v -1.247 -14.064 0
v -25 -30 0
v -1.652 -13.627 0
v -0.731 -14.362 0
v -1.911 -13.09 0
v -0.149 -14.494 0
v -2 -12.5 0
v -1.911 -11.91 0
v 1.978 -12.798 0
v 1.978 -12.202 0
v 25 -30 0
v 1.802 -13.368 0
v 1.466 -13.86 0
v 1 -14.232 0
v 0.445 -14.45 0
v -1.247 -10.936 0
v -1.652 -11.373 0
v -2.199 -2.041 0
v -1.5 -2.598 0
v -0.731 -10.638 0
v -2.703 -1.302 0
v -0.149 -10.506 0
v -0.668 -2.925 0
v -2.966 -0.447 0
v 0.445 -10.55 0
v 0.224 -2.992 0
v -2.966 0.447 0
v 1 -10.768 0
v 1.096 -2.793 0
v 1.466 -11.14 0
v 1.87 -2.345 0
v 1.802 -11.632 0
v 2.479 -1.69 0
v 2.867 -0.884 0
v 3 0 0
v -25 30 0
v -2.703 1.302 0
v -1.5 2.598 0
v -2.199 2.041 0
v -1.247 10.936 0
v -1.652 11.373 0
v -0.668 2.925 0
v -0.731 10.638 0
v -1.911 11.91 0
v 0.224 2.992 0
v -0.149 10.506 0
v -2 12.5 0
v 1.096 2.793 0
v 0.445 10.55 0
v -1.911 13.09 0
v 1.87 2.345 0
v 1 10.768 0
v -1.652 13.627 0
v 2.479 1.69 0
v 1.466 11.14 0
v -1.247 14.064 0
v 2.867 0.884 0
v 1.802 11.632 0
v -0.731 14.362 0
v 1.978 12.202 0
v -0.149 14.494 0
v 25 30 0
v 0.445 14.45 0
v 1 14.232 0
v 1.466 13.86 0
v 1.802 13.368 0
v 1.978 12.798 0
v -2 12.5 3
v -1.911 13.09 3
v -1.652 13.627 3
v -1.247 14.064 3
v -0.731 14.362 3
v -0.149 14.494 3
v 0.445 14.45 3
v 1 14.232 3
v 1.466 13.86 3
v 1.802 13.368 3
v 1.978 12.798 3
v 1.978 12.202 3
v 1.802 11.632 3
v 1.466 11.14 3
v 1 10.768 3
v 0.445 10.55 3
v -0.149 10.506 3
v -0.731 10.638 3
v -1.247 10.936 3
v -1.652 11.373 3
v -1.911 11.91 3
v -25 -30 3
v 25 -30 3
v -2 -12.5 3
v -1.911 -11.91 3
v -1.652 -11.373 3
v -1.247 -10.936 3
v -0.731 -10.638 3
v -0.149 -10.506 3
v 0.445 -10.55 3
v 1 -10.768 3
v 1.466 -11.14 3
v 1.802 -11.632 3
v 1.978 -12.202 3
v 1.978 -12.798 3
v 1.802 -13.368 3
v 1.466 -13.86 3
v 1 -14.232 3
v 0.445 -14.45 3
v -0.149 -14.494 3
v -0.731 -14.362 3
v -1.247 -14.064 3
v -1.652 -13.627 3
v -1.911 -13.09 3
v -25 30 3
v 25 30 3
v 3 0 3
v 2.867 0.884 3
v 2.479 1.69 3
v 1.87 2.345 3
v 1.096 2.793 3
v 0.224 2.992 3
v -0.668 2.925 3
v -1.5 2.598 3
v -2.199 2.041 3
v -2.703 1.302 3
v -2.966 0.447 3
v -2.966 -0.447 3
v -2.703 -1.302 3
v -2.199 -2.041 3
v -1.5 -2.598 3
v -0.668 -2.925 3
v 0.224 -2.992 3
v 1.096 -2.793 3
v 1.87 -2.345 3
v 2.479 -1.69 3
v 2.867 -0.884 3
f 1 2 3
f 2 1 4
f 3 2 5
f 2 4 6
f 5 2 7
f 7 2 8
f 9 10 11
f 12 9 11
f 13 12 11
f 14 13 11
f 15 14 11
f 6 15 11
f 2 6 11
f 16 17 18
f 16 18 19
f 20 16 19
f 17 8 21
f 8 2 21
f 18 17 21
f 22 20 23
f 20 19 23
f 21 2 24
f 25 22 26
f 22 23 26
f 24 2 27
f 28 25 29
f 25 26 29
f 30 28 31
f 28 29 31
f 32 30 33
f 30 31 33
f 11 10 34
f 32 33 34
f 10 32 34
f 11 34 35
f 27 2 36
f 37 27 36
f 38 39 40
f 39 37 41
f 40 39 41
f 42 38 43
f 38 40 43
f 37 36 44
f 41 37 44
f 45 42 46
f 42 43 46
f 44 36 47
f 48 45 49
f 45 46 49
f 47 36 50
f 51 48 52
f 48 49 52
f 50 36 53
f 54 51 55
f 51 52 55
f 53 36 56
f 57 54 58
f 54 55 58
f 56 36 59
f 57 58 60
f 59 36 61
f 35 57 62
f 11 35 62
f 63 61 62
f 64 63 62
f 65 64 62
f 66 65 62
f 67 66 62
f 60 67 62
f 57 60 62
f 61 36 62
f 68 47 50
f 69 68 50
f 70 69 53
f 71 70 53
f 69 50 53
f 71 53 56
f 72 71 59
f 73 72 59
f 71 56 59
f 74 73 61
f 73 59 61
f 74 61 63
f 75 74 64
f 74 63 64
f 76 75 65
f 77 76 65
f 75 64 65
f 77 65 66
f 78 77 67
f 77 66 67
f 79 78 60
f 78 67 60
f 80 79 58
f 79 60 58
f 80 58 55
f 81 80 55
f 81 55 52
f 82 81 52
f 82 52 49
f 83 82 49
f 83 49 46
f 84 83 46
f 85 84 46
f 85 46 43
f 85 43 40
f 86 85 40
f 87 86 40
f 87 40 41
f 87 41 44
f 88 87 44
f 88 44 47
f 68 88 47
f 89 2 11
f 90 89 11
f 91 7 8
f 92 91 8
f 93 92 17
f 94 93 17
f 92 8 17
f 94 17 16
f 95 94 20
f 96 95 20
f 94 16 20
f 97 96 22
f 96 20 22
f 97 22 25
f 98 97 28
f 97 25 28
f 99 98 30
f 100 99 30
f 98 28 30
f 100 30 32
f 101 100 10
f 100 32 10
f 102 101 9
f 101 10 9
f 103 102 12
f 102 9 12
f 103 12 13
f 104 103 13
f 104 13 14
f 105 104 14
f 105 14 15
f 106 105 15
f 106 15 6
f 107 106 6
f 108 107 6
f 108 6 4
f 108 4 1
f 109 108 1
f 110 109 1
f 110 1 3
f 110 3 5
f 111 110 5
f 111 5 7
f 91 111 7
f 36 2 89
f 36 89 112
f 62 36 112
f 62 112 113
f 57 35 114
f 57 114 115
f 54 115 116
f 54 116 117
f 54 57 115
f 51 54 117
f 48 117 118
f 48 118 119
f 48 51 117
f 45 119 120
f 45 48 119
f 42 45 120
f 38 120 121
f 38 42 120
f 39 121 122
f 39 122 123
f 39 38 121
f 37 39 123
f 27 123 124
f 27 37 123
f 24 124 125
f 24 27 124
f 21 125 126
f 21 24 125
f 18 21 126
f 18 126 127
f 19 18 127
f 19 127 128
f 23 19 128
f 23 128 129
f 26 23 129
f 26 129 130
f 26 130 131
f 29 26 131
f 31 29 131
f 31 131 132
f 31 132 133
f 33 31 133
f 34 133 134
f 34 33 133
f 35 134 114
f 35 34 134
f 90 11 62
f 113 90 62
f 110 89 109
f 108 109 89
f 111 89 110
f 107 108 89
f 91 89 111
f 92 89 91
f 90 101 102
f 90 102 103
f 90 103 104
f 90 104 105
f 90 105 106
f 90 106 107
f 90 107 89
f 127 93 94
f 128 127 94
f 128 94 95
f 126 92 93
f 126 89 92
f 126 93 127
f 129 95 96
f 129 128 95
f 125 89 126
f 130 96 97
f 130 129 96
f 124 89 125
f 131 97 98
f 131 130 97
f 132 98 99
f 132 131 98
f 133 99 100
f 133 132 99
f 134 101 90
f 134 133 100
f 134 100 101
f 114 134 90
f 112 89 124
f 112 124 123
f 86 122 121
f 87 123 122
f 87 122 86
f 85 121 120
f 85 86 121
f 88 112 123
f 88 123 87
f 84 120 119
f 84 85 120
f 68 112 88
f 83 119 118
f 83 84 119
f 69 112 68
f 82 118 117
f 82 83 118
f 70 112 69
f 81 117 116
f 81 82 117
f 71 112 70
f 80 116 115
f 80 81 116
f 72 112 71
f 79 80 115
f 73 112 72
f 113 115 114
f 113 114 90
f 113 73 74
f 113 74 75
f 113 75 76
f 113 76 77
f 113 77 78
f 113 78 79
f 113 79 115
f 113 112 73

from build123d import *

# Parameters (mm, degrees)
SKETCH1_W           = 50
SKETCH1_H           = 60
SKETCH1_R           = 3
BOSS_EXTRUDE1_DEPTH = 3
SKETCH2_R           = 2
CUT_EXTRUDE1_DEPTH  = 4


with BuildPart() as part:
    # Sketch1 → Boss-Extrude1 (new body)
    with BuildSketch(Plane.XY):
        Rectangle(SKETCH1_W, SKETCH1_H)
        Circle(SKETCH1_R, mode=Mode.SUBTRACT)
    extrude(amount=BOSS_EXTRUDE1_DEPTH)

    # Sketch2 → Cut-Extrude1 (cut, through all)
    with BuildSketch(Plane(origin=(0, 0, 0), x_dir=(-1, 0, 0), z_dir=(0, 0, -1))):
        with Locations((0, 12.5)):
            Circle(SKETCH2_R)
        with Locations((0, -12.5)):
            Circle(SKETCH2_R)
    extrude(amount=-CUT_EXTRUDE1_DEPTH, mode=Mode.SUBTRACT)


solid = part.part
